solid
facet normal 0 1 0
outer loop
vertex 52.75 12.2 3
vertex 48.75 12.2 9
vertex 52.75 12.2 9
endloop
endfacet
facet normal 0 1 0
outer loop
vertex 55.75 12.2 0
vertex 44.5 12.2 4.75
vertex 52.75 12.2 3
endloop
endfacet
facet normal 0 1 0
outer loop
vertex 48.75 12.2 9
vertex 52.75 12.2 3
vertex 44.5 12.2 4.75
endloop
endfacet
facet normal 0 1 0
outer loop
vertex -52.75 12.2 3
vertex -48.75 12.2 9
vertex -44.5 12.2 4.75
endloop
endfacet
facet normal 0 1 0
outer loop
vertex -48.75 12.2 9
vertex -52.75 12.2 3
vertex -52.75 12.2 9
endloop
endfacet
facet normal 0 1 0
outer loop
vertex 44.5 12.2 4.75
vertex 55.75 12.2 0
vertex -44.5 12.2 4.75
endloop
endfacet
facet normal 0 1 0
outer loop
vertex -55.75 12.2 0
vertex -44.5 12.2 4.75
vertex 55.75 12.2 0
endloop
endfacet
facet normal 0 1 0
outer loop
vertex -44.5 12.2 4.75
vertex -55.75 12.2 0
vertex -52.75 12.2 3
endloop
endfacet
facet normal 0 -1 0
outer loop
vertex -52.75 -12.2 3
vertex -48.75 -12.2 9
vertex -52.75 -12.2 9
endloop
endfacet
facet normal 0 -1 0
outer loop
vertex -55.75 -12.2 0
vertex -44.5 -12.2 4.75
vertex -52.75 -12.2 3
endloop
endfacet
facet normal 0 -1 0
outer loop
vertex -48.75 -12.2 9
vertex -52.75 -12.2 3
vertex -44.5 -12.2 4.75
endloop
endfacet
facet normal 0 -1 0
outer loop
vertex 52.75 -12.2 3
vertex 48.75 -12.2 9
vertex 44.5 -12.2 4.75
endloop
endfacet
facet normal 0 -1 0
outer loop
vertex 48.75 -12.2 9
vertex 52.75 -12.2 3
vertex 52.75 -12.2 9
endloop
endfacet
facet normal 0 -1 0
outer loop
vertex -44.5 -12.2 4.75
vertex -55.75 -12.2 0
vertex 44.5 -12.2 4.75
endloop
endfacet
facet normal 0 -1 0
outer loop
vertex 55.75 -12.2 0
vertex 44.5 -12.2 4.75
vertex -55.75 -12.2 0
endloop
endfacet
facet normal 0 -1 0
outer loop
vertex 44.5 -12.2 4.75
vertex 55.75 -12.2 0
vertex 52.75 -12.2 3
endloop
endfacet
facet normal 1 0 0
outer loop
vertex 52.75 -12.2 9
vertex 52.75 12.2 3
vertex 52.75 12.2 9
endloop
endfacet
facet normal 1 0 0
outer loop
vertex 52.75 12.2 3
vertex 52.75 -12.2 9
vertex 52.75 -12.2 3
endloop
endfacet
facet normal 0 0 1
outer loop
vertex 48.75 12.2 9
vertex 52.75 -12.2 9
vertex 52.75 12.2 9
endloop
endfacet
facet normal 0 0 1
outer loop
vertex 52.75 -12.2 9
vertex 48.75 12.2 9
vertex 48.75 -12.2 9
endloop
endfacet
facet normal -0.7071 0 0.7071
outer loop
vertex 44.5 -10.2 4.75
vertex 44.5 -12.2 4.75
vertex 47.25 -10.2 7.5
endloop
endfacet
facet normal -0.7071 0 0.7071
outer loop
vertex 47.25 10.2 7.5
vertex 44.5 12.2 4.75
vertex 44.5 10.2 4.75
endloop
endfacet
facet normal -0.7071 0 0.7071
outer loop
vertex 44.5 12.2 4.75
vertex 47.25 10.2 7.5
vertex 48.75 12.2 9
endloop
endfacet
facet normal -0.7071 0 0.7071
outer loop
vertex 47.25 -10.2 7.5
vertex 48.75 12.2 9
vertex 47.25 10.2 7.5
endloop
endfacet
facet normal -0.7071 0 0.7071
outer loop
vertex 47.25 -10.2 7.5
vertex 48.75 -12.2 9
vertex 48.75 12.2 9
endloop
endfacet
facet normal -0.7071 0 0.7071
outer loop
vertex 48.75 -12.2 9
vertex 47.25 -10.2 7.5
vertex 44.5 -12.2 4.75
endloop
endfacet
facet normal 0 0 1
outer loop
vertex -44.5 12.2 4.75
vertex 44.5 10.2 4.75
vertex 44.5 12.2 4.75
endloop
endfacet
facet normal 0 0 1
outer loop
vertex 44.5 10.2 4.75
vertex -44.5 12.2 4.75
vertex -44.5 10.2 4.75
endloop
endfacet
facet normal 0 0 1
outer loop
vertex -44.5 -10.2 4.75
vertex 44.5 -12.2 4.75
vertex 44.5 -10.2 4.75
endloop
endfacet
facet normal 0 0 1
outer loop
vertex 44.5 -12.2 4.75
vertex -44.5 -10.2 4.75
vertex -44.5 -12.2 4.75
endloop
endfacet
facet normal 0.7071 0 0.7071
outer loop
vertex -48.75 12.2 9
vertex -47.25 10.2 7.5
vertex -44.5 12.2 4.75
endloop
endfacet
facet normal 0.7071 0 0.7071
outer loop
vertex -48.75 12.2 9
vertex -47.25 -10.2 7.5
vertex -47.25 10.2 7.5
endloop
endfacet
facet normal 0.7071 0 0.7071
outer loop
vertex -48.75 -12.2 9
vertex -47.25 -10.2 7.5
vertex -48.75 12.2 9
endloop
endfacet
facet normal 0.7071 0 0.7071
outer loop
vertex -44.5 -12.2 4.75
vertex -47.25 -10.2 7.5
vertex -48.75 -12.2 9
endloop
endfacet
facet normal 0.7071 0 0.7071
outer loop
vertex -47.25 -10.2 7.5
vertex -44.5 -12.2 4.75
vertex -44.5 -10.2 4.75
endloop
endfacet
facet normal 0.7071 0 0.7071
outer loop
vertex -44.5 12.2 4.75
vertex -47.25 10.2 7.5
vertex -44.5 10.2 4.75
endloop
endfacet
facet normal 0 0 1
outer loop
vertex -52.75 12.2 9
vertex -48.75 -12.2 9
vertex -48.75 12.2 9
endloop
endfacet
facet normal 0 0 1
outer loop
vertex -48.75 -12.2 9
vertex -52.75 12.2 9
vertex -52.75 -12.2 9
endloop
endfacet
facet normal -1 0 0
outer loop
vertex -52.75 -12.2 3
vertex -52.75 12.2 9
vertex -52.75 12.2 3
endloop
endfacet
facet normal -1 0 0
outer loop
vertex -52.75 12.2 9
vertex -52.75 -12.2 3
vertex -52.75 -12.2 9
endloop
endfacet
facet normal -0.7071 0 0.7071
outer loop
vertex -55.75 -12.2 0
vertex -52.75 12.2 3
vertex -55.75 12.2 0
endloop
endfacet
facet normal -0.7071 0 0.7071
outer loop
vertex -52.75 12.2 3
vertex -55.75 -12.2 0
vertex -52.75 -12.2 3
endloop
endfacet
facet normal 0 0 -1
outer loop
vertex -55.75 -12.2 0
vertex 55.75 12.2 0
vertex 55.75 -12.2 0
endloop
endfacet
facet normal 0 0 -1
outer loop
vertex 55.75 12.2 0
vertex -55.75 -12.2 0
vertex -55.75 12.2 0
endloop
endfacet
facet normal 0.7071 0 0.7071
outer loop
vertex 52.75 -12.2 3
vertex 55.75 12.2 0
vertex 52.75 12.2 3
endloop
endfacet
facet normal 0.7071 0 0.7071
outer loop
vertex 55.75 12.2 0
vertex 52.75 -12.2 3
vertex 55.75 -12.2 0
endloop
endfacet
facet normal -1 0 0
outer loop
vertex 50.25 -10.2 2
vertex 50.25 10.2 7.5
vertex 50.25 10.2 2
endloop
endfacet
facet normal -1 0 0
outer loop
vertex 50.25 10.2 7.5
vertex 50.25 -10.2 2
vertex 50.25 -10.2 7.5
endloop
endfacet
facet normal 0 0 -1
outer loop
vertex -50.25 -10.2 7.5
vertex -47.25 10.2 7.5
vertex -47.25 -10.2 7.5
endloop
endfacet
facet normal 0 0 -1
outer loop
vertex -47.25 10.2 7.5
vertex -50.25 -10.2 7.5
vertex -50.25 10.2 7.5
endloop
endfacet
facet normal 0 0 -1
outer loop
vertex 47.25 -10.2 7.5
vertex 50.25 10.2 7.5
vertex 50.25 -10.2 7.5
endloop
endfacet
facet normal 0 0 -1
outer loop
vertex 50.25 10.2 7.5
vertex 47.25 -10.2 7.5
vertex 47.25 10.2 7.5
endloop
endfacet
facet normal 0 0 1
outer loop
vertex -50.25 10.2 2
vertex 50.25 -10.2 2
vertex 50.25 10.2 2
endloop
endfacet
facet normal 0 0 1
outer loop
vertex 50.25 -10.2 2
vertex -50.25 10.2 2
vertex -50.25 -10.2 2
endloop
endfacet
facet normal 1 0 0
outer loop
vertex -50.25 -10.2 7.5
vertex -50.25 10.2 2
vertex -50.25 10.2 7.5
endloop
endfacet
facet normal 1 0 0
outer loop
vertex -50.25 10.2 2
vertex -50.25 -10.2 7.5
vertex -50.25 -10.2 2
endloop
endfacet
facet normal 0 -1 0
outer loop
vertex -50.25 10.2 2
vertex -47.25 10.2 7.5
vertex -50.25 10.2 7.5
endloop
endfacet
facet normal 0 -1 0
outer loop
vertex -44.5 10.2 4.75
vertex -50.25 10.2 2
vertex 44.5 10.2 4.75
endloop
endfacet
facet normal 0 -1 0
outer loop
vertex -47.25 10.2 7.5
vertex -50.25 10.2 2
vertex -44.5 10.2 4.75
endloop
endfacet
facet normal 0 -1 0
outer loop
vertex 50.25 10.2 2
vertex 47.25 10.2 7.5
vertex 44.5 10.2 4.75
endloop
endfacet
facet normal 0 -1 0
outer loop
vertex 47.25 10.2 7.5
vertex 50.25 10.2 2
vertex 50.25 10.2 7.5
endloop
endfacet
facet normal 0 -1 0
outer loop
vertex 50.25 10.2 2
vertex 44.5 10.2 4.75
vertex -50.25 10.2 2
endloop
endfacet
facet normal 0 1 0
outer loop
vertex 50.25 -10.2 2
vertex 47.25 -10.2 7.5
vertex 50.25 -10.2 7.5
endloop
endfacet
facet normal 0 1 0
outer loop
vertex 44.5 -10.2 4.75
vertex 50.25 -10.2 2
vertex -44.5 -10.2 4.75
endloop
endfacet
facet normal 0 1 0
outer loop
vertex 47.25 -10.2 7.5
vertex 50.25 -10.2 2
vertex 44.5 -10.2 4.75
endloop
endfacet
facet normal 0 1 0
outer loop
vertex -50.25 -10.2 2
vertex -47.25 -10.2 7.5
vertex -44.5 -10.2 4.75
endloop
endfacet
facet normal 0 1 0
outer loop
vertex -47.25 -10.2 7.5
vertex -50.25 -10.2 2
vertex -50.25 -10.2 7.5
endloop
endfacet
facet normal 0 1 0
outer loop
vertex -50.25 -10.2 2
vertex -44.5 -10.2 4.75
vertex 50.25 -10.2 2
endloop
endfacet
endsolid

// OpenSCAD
stoneLength = 100;
stoneThickness = 5;
stoneWidth = 20;
sideWall = 2;
endWall = 2.5;
recess = 2.5;
lipThickness = 1.5;
lipLength = 4;
backingThickness = 2;
stickoutSize = 3;
stoneHolderWidth = 2;
thicknessTolerance = 0.25;
endTolerance = 0.25;
sideTolerance = 0.2;

module dummy() {}

l = stoneLength+2*endWall+2*endTolerance+2*stickoutSize;
hStone = stoneThickness+2*thicknessTolerance;
h1 = hStone-thicknessTolerance+backingThickness-recess;
h2 = hStone+backingThickness+lipThickness;
w = sideWall*2+2*sideTolerance+stoneWidth;

module side() {
    polygon([
        [0,0], [l,0], [l-stickoutSize,stickoutSize],
        [l-stickoutSize,h2],[l-stickoutSize-lipLength,h2],[l-stickoutSize-lipLength-(h2-h1),h1],
        [stickoutSize+lipLength+(h2-h1),h1],[stickoutSize+lipLength,h2],[stickoutSize,h2],
        [stickoutSize,stickoutSize] ]);
}

difference() {
    translate([-l/2,0,0]) rotate([90,0,0]) linear_extrude(height=w,center=true) side();
    translate([0,0,hStone/2+backingThickness]) cube([stoneLength+2*endTolerance,stoneWidth+2*sideTolerance,hStone],center=true);
}
